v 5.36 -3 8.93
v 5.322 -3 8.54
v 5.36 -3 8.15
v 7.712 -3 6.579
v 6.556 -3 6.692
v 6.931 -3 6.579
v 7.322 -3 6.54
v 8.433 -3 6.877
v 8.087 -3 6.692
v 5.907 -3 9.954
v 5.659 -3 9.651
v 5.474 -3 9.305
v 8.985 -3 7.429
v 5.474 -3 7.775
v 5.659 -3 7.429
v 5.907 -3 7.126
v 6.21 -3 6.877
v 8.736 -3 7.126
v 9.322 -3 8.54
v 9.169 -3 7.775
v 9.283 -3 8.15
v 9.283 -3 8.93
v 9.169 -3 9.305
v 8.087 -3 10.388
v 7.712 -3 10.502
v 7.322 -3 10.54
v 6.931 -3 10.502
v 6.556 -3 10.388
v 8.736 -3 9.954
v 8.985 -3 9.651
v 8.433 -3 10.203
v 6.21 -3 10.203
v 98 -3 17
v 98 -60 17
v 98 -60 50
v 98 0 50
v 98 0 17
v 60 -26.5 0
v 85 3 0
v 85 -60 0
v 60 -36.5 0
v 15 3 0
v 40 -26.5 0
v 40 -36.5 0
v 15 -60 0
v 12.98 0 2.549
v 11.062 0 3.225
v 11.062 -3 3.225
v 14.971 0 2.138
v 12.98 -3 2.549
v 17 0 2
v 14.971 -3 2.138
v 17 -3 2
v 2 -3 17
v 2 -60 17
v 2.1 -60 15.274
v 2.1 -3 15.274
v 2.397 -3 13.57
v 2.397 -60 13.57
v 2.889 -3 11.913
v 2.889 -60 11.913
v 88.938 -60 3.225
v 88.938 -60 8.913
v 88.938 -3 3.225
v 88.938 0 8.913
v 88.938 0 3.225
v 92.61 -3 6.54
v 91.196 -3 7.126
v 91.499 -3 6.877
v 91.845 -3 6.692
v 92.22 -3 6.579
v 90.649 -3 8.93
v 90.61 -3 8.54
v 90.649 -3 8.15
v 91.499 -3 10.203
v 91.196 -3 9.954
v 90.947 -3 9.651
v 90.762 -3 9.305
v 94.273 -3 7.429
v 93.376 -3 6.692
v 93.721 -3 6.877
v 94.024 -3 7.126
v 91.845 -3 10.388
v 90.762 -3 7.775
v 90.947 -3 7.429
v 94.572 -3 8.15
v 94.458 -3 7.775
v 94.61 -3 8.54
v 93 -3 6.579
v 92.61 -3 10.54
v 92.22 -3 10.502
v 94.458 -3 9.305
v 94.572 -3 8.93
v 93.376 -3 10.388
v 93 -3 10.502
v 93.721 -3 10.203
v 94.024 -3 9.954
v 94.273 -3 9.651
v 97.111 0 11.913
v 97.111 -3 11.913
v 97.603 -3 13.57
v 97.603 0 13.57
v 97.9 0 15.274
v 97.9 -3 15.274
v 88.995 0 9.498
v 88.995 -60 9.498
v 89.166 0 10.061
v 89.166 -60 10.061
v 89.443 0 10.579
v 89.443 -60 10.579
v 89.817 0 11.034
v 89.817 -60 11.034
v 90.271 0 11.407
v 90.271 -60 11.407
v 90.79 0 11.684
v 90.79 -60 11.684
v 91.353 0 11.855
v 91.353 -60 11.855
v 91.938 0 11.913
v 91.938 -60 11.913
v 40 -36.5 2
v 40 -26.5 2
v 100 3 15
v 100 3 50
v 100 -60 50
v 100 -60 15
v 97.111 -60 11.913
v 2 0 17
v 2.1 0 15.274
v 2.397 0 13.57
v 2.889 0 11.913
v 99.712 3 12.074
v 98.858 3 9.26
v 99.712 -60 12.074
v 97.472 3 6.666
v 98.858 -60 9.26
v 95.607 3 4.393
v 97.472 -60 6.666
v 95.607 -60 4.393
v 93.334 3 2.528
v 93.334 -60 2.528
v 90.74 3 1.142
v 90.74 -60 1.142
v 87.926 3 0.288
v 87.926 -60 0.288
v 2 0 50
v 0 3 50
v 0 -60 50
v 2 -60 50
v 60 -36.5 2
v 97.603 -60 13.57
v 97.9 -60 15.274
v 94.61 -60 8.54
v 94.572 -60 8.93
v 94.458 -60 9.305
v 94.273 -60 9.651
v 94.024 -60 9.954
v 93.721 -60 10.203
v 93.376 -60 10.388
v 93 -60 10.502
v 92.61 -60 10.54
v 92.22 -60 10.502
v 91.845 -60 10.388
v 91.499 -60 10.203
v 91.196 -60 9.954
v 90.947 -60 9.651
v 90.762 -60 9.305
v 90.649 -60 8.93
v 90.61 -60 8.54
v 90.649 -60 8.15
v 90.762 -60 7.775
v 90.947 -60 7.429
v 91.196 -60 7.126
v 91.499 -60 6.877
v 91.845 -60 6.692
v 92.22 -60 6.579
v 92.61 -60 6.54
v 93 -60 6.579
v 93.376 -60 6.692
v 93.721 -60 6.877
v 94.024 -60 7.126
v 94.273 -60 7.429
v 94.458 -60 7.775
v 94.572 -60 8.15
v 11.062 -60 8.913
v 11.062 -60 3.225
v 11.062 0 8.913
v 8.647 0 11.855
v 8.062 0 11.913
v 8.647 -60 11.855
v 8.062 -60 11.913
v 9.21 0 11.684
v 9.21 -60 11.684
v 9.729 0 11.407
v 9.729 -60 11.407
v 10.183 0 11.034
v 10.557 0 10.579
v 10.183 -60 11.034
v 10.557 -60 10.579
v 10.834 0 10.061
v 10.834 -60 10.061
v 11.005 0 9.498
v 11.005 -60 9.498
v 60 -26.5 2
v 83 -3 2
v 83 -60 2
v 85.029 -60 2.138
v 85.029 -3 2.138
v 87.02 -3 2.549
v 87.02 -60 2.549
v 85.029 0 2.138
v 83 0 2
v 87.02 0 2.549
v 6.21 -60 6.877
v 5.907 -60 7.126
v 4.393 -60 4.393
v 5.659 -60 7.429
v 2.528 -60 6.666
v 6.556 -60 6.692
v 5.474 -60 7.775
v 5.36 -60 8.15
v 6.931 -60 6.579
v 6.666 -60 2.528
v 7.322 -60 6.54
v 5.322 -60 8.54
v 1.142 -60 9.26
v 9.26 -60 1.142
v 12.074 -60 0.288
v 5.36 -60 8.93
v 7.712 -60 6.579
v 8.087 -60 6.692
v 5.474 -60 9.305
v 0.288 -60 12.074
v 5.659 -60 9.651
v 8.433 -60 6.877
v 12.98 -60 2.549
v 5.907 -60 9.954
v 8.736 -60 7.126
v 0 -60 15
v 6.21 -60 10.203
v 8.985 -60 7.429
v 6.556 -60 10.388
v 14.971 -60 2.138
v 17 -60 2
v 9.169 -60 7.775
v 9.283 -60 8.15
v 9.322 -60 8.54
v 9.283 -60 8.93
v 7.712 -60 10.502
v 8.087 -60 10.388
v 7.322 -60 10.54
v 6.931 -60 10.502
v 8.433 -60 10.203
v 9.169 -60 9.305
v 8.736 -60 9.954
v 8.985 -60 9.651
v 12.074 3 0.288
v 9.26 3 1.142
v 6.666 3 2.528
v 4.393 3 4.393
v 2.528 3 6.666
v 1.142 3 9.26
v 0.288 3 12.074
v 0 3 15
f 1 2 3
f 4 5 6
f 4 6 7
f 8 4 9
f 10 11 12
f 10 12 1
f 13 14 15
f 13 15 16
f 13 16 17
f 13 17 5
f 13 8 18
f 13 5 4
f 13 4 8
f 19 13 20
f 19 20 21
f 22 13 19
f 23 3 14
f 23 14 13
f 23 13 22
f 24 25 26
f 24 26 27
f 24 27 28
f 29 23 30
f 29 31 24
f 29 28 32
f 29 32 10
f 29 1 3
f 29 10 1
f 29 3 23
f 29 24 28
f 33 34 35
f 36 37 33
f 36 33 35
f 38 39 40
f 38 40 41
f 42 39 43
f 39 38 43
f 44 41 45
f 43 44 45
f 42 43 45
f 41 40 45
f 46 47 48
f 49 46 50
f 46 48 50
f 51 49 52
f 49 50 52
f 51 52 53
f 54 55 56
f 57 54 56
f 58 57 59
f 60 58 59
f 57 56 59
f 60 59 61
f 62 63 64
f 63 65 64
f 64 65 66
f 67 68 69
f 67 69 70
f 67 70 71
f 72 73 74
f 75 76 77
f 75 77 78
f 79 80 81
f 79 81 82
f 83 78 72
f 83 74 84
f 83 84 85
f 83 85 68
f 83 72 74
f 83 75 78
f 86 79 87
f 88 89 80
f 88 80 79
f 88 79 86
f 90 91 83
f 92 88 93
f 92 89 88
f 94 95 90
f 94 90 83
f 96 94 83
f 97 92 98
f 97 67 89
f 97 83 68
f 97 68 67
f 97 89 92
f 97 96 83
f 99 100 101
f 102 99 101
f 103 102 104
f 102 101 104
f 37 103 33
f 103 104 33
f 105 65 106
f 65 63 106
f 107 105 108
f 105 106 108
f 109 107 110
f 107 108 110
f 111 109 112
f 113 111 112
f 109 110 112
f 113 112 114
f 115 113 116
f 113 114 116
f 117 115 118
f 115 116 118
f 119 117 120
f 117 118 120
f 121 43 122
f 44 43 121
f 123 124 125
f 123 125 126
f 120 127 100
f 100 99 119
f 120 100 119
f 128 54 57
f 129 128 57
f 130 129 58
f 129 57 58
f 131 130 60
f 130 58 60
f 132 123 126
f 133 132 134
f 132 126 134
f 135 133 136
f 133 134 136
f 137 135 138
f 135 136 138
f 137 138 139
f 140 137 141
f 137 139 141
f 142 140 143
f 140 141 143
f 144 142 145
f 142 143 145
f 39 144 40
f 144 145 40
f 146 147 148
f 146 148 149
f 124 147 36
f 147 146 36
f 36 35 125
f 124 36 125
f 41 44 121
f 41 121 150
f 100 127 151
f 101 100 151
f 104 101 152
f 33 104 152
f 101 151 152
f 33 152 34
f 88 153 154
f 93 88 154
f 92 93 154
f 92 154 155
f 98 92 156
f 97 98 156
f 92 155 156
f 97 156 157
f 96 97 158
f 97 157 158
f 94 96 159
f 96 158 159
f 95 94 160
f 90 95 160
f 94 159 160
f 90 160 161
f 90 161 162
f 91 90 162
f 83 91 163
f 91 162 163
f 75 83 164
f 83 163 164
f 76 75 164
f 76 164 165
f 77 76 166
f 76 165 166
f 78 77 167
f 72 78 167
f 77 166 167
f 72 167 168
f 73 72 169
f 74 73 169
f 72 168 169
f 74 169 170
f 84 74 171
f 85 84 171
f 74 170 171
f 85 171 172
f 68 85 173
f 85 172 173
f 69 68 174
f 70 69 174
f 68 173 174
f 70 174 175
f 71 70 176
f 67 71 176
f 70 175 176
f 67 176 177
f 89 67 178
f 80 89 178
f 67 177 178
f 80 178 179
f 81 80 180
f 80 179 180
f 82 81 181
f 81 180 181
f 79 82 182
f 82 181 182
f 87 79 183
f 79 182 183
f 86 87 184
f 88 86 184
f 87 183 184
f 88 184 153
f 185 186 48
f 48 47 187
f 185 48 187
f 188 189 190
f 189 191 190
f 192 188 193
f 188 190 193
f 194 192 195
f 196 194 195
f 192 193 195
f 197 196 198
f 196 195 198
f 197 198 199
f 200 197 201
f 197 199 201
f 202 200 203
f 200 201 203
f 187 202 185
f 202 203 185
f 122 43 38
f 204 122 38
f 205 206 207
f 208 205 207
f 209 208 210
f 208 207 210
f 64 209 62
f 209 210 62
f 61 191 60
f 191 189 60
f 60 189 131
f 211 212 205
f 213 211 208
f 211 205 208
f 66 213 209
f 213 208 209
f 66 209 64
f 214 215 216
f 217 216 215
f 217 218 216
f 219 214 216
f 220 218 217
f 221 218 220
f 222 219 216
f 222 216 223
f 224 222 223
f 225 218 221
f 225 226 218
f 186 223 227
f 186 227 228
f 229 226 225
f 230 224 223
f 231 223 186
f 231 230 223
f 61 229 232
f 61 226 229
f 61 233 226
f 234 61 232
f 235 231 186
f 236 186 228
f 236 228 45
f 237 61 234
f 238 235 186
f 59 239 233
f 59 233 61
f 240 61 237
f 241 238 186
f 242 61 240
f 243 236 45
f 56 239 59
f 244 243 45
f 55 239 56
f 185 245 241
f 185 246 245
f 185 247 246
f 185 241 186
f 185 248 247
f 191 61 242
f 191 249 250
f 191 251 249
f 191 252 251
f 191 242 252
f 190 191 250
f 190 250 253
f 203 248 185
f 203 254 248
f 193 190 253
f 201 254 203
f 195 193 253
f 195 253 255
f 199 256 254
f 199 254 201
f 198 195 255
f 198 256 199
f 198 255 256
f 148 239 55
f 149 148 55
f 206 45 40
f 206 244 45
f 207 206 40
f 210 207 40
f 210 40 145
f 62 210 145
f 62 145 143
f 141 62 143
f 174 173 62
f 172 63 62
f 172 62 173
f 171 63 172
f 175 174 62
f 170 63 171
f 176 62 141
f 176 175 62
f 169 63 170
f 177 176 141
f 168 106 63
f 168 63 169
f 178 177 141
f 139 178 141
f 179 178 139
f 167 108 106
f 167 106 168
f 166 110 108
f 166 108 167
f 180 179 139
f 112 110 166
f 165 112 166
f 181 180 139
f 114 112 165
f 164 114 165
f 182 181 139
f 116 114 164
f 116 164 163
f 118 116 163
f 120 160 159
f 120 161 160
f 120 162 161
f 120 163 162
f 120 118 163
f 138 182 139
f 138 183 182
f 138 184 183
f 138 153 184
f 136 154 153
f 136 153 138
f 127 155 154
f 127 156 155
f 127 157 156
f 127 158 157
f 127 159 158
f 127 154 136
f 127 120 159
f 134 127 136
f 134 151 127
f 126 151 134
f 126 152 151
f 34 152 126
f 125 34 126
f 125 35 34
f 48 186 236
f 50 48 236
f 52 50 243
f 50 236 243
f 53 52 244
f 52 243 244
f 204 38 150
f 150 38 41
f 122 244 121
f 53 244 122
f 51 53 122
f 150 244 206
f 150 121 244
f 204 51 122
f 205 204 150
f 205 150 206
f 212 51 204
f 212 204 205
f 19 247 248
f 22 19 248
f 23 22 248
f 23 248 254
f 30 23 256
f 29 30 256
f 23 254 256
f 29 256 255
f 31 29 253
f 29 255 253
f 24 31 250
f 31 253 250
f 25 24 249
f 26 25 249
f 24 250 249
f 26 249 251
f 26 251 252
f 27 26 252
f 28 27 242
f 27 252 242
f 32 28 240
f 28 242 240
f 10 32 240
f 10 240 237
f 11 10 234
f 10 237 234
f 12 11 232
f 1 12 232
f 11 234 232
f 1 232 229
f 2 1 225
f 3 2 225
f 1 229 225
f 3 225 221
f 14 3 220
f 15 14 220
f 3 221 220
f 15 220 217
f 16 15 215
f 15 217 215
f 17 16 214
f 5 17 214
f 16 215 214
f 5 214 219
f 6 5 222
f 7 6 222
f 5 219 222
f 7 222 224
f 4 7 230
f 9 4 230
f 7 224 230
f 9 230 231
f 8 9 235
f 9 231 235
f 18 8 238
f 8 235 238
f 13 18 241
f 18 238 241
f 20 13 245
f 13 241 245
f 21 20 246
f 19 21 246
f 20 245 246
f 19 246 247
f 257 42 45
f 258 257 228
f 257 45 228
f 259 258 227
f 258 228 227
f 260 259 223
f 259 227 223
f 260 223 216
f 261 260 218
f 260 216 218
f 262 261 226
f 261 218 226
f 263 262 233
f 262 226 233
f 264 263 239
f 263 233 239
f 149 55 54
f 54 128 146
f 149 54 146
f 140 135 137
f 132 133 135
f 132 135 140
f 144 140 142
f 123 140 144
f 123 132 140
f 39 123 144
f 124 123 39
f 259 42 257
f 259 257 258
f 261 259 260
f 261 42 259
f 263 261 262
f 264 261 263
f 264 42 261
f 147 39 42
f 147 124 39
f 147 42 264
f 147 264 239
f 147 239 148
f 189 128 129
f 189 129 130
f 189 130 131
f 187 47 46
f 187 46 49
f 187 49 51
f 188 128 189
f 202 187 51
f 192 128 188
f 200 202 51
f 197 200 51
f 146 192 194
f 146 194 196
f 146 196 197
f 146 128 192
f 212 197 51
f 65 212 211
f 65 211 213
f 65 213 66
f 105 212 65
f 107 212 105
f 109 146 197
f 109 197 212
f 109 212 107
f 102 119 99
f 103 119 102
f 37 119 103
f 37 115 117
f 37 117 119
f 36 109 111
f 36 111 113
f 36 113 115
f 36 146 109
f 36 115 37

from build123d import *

# Parameters (mm, degrees)
F0_W           = 100
F0_H           = 50
F0_W_2         = 96
F0_H_2         = 46
F1_DEPTH       = 65
F2_W           = 100
F2_H           = 8.5998633876
F3_DEPTH       = 62.6
F4_W           = 100
F4_H           = 50
F5_DEPTH       = 3
F6_W           = 96
F6_H           = 53.983375689
F7_DEPTH       = 80.8
F8_W           = 100
F8_H           = 100
F9_DEPTH       = 5
F10_W          = 178.9870522916
F10_H          = 171.902321279
F11_DEPTH      = 2
F12_W          = 20
F12_H          = 10
F13_DEPTH      = 25
F14_R          = 2.2
F15_DEPTH      = 3
F16_R          = 5
F17_R          = 15
F18_R          = 1.5
F19_DEPTH      = 25
F20_W          = 18.0335491896
F20_H          = 117.1614909545
F21_DEPTH      = 124.6
F21_DEPTH_BACK = 25
F23_DEPTH      = 57
F24_R          = 2
F25_DEPTH      = 57
F27_DEPTH      = 3
F29_DEPTH      = 3
F30_R          = 3


with BuildPart() as f1:
    # F0 (on Front) → F1 (new body)
    with BuildSketch(Plane.XZ):
        with Locations((50, 25)):
            Rectangle(F0_W, F0_H)
        with Locations((50, 25)):
            Rectangle(F0_W_2, F0_H_2, mode=Mode.SUBTRACT)
    extrude(amount=F1_DEPTH)

    # F2 (on face) → F3 (cut)
    with BuildSketch(Plane.XZ.offset(65)):
        with Locations((50, -4.2999316938)):
            Rectangle(F2_W, F2_H)
    extrude(amount=-F3_DEPTH, mode=Mode.SUBTRACT)

    # F4 (on face) → F5 (join)
    with BuildSketch(Plane(origin=(0, 0, 0), x_dir=(-1, 0, 0), z_dir=(0, 1, 0))):
        with Locations((-50, 25)):
            Rectangle(F4_W, F4_H)
    extrude(amount=-F5_DEPTH)

    # F6 (on face) → F7 (cut)
    with BuildSketch(Plane.XZ.offset(3)):
        with Locations((50, 28.9916878445)):
            Rectangle(F6_W, F6_H)
    extrude(amount=F7_DEPTH, mode=Mode.SUBTRACT)

    # F8 (on face) → F9 (join)
    with BuildSketch(Plane.XZ.offset(65)):
        with Locations((50, 50)):
            Rectangle(F8_W, F8_H)
    extrude(amount=-F9_DEPTH)

    # F10 (on face) → F11 (cut)
    with BuildSketch(Plane.XZ.offset(65)):
        with Locations((42.4427408725, 49.3266619742)):
            Rectangle(F10_W, F10_H)
    extrude(amount=-F11_DEPTH, mode=Mode.SUBTRACT)

    # F12 (on face) → F13 (cut)
    with BuildSketch(Plane(origin=(0, 0, 0), x_dir=(1, 0, 0), z_dir=(0, 0, -1))):
        with Locations((50, 31.5)):
            Rectangle(F12_W, F12_H)
    extrude(amount=-F13_DEPTH, mode=Mode.SUBTRACT)

    # F14 (on face) → F15 (join)
    with BuildSketch(Plane.XZ.offset(63)):
        with BuildLine():
            Line((106, 60.561312139), (105.3350197713, 60.561312139))
            ThreePointArc((105.3350197713, 60.561312139), (105.6675098856, 60.5502449231), (106, 60.561312139))
        make_face()
        with BuildLine():
            Line((100, 60.561312139), (105.3350197713, 60.561312139))
            Line((105.3350197713, 60.561312139), (106, 60.561312139))
            ThreePointArc((106, 60.561312139), (110.6649022052, 65.7117070069), (105.6772652089, 70.5502354065))
            Line((105.6772652089, 70.5502354065), (100, 70.561312139))
            Line((100, 70.561312139), (100, 60.561312139))
        make_face()
        with Locations((105.6675098856, 65.5502449231)):
            Circle(F14_R, mode=Mode.SUBTRACT)
        with BuildLine():
            Line((-5.3350197713, 60.561312139), (0, 60.561312139))
            Line((0, 60.561312139), (0, 70.561312139))
            Line((0, 70.561312139), (-5.6772652089, 70.5502354065))
            ThreePointArc((-5.6772652089, 70.5502354065), (-10.6649022052, 65.7117070069), (-6, 60.561312139))
            Line((-6, 60.561312139), (-5.3350197713, 60.561312139))
        make_face()
        with Locations((-5.6675098856, 65.5502449231)):
            Circle(F14_R, mode=Mode.SUBTRACT)
        with BuildLine():
            ThreePointArc((-6, 60.561312139), (-5.6675098856, 60.5502449231), (-5.3350197713, 60.561312139))
            Line((-5.3350197713, 60.561312139), (-6, 60.561312139))
        make_face()
    extrude(amount=-F15_DEPTH)

    # F16
    f16_edges = [f1.edges().sort_by_distance(p)[0] for p in [
        (100, -61.5, 60.561312),
        (100, -61.5, 70.561312),
        (0, -61.5, 60.561312),
        (0, -61.5, 70.561312),
    ]]
    fillet(f16_edges, radius=F16_R)

    # F17
    f17_edges = [f1.edges().sort_by_distance(p)[0] for p in [
        (98, -31.5, 2),
        (2, -31.5, 2),
        (100, -31.5, 0),
        (0, -31.5, 0),
    ]]
    fillet(f17_edges, radius=F17_R)

    # F18 (on face) → F19 (cut)
    with BuildSketch(Plane.XZ.offset(63)):
        with Locations((85, 15)):
            Circle(F18_R)
        with Locations((85, 23)):
            Circle(F18_R)
        with Locations((85, 31)):
            Circle(F18_R)
        with Locations((85, 39)):
            Circle(F18_R)
        with Locations((85, 47)):
            Circle(F18_R)
        with Locations((77, 15)):
            Circle(F18_R)
        with Locations((77, 23)):
            Circle(F18_R)
        with Locations((77, 31)):
            Circle(F18_R)
        with Locations((77, 39)):
            Circle(F18_R)
        with Locations((77, 47)):
            Circle(F18_R)
        with Locations((69, 15)):
            Circle(F18_R)
        with Locations((69, 23)):
            Circle(F18_R)
        with Locations((69, 31)):
            Circle(F18_R)
        with Locations((69, 39)):
            Circle(F18_R)
        with Locations((69, 47)):
            Circle(F18_R)
        with Locations((61, 15)):
            Circle(F18_R)
        with Locations((61, 23)):
            Circle(F18_R)
        with Locations((61, 31)):
            Circle(F18_R)
        with Locations((61, 39)):
            Circle(F18_R)
        with Locations((61, 47)):
            Circle(F18_R)
        with Locations((53, 15)):
            Circle(F18_R)
        with Locations((53, 23)):
            Circle(F18_R)
        with Locations((53, 31)):
            Circle(F18_R)
        with Locations((53, 39)):
            Circle(F18_R)
        with Locations((53, 47)):
            Circle(F18_R)
        with Locations((45, 15)):
            Circle(F18_R)
        with Locations((45, 23)):
            Circle(F18_R)
        with Locations((45, 31)):
            Circle(F18_R)
        with Locations((45, 39)):
            Circle(F18_R)
        with Locations((45, 47)):
            Circle(F18_R)
        with Locations((37, 15)):
            Circle(F18_R)
        with Locations((37, 23)):
            Circle(F18_R)
        with Locations((37, 31)):
            Circle(F18_R)
        with Locations((37, 39)):
            Circle(F18_R)
        with Locations((37, 47)):
            Circle(F18_R)
        with Locations((29, 15)):
            Circle(F18_R)
        with Locations((29, 23)):
            Circle(F18_R)
        with Locations((29, 31)):
            Circle(F18_R)
        with Locations((29, 39)):
            Circle(F18_R)
        with Locations((29, 47)):
            Circle(F18_R)
        with Locations((21, 15)):
            Circle(F18_R)
        with Locations((21, 23)):
            Circle(F18_R)
        with Locations((21, 31)):
            Circle(F18_R)
        with Locations((21, 39)):
            Circle(F18_R)
        with Locations((21, 47)):
            Circle(F18_R)
        with Locations((13, 15)):
            Circle(F18_R)
        with Locations((13, 23)):
            Circle(F18_R)
        with Locations((13, 31)):
            Circle(F18_R)
        with Locations((13, 39)):
            Circle(F18_R)
        with Locations((13, 47)):
            Circle(F18_R)
    extrude(amount=-F19_DEPTH, mode=Mode.SUBTRACT)

    # F20 (on face) → F21 (cut, two sides)
    with BuildSketch(Plane(origin=(0, 0, 0), x_dir=(0, -1, 0), z_dir=(-1, 0, 0))) as f21_sk:
        with Locations((69.0167745948, 41.4192545228)):
            Rectangle(F20_W, F20_H)
    extrude(amount=-F21_DEPTH, mode=Mode.SUBTRACT)
    extrude(f21_sk.sketch, amount=F21_DEPTH_BACK, mode=Mode.SUBTRACT)

    # F22 (on face) → F23 (join, through all)
    with BuildSketch(Plane.XZ.offset(3)):
        Polygon((88.93782569, 11.9127326198), (88.93782569, 3.2253048645), (97.1109783715, 6.1686190363), (97.1109783715, 11.9127326198), align=None)
        Polygon((2.8890216285, 11.9127326198), (2.8890216285, 6.1686190363), (11.06217431, 3.2253048645), (11.06217431, 11.9127326198), align=None)
    extrude(amount=F23_DEPTH)

    # F24 (on face) → F25 (cut, through all)
    with BuildSketch(Plane.XZ.offset(60)):
        with Locations((92.6101825469, 8.5401255637)):
            Circle(F24_R)
        with Locations((7.32162036, 8.5401255637)):
            Circle(F24_R)
    extrude(amount=-F25_DEPTH, mode=Mode.SUBTRACT)

    # F26 (on face) → F27 (join)
    with BuildSketch(Plane(origin=(0, 0, 0), x_dir=(-1, 0, 0), z_dir=(0, 1, 0))):
        with BuildLine():
            ThreePointArc((-100, 15), (-95.6066017178, 4.3933982822), (-85, 0))
            Line((-85, 0), (-15, 0))
            ThreePointArc((-15, 0), (-4.3933982822, 4.3933982822), (0, 15))
            Line((0, 15), (0, 50))
            Line((0, 50), (-100, 50))
            Line((-100, 50), (-100, 15))
        make_face()
    extrude(amount=F27_DEPTH)

    # F28 (on face) → F29 (cut)
    with BuildSketch(Plane.XZ.offset(3)):
        with BuildLine():
            ThreePointArc((2, 17), (2.2239268482, 14.4178183229), (2.8890216285, 11.9127326198))
            Line((2.8890216285, 11.9127326198), (11.06217431, 11.9127326198))
            Line((11.06217431, 11.9127326198), (11.06217431, 3.2253048645))
            ThreePointArc((11.06217431, 3.2253048645), (13.9685339382, 2.3095196295), (17, 2))
            Line((17, 2), (83, 2))
            ThreePointArc((83, 2), (86.0314660618, 2.3095196295), (88.93782569, 3.2253048645))
            Line((88.93782569, 3.2253048645), (88.93782569, 11.9127326198))
            Line((88.93782569, 11.9127326198), (97.1109783715, 11.9127326198))
            ThreePointArc((97.1109783715, 11.9127326198), (97.7760731518, 14.4178183229), (98, 17))
            Line((98, 17), (98, 50))
            Line((98, 50), (2, 50))
            Line((2, 50), (2, 17))
        make_face()
    extrude(amount=-F29_DEPTH, mode=Mode.SUBTRACT)

    # F30
    f30_edges = [f1.edges().sort_by_distance(p)[0] for p in [
        (88.937826, -30, 11.912733),
        (11.062174, -30, 11.912733),
    ]]
    fillet(f30_edges, radius=F30_R)


solid = f1.part
